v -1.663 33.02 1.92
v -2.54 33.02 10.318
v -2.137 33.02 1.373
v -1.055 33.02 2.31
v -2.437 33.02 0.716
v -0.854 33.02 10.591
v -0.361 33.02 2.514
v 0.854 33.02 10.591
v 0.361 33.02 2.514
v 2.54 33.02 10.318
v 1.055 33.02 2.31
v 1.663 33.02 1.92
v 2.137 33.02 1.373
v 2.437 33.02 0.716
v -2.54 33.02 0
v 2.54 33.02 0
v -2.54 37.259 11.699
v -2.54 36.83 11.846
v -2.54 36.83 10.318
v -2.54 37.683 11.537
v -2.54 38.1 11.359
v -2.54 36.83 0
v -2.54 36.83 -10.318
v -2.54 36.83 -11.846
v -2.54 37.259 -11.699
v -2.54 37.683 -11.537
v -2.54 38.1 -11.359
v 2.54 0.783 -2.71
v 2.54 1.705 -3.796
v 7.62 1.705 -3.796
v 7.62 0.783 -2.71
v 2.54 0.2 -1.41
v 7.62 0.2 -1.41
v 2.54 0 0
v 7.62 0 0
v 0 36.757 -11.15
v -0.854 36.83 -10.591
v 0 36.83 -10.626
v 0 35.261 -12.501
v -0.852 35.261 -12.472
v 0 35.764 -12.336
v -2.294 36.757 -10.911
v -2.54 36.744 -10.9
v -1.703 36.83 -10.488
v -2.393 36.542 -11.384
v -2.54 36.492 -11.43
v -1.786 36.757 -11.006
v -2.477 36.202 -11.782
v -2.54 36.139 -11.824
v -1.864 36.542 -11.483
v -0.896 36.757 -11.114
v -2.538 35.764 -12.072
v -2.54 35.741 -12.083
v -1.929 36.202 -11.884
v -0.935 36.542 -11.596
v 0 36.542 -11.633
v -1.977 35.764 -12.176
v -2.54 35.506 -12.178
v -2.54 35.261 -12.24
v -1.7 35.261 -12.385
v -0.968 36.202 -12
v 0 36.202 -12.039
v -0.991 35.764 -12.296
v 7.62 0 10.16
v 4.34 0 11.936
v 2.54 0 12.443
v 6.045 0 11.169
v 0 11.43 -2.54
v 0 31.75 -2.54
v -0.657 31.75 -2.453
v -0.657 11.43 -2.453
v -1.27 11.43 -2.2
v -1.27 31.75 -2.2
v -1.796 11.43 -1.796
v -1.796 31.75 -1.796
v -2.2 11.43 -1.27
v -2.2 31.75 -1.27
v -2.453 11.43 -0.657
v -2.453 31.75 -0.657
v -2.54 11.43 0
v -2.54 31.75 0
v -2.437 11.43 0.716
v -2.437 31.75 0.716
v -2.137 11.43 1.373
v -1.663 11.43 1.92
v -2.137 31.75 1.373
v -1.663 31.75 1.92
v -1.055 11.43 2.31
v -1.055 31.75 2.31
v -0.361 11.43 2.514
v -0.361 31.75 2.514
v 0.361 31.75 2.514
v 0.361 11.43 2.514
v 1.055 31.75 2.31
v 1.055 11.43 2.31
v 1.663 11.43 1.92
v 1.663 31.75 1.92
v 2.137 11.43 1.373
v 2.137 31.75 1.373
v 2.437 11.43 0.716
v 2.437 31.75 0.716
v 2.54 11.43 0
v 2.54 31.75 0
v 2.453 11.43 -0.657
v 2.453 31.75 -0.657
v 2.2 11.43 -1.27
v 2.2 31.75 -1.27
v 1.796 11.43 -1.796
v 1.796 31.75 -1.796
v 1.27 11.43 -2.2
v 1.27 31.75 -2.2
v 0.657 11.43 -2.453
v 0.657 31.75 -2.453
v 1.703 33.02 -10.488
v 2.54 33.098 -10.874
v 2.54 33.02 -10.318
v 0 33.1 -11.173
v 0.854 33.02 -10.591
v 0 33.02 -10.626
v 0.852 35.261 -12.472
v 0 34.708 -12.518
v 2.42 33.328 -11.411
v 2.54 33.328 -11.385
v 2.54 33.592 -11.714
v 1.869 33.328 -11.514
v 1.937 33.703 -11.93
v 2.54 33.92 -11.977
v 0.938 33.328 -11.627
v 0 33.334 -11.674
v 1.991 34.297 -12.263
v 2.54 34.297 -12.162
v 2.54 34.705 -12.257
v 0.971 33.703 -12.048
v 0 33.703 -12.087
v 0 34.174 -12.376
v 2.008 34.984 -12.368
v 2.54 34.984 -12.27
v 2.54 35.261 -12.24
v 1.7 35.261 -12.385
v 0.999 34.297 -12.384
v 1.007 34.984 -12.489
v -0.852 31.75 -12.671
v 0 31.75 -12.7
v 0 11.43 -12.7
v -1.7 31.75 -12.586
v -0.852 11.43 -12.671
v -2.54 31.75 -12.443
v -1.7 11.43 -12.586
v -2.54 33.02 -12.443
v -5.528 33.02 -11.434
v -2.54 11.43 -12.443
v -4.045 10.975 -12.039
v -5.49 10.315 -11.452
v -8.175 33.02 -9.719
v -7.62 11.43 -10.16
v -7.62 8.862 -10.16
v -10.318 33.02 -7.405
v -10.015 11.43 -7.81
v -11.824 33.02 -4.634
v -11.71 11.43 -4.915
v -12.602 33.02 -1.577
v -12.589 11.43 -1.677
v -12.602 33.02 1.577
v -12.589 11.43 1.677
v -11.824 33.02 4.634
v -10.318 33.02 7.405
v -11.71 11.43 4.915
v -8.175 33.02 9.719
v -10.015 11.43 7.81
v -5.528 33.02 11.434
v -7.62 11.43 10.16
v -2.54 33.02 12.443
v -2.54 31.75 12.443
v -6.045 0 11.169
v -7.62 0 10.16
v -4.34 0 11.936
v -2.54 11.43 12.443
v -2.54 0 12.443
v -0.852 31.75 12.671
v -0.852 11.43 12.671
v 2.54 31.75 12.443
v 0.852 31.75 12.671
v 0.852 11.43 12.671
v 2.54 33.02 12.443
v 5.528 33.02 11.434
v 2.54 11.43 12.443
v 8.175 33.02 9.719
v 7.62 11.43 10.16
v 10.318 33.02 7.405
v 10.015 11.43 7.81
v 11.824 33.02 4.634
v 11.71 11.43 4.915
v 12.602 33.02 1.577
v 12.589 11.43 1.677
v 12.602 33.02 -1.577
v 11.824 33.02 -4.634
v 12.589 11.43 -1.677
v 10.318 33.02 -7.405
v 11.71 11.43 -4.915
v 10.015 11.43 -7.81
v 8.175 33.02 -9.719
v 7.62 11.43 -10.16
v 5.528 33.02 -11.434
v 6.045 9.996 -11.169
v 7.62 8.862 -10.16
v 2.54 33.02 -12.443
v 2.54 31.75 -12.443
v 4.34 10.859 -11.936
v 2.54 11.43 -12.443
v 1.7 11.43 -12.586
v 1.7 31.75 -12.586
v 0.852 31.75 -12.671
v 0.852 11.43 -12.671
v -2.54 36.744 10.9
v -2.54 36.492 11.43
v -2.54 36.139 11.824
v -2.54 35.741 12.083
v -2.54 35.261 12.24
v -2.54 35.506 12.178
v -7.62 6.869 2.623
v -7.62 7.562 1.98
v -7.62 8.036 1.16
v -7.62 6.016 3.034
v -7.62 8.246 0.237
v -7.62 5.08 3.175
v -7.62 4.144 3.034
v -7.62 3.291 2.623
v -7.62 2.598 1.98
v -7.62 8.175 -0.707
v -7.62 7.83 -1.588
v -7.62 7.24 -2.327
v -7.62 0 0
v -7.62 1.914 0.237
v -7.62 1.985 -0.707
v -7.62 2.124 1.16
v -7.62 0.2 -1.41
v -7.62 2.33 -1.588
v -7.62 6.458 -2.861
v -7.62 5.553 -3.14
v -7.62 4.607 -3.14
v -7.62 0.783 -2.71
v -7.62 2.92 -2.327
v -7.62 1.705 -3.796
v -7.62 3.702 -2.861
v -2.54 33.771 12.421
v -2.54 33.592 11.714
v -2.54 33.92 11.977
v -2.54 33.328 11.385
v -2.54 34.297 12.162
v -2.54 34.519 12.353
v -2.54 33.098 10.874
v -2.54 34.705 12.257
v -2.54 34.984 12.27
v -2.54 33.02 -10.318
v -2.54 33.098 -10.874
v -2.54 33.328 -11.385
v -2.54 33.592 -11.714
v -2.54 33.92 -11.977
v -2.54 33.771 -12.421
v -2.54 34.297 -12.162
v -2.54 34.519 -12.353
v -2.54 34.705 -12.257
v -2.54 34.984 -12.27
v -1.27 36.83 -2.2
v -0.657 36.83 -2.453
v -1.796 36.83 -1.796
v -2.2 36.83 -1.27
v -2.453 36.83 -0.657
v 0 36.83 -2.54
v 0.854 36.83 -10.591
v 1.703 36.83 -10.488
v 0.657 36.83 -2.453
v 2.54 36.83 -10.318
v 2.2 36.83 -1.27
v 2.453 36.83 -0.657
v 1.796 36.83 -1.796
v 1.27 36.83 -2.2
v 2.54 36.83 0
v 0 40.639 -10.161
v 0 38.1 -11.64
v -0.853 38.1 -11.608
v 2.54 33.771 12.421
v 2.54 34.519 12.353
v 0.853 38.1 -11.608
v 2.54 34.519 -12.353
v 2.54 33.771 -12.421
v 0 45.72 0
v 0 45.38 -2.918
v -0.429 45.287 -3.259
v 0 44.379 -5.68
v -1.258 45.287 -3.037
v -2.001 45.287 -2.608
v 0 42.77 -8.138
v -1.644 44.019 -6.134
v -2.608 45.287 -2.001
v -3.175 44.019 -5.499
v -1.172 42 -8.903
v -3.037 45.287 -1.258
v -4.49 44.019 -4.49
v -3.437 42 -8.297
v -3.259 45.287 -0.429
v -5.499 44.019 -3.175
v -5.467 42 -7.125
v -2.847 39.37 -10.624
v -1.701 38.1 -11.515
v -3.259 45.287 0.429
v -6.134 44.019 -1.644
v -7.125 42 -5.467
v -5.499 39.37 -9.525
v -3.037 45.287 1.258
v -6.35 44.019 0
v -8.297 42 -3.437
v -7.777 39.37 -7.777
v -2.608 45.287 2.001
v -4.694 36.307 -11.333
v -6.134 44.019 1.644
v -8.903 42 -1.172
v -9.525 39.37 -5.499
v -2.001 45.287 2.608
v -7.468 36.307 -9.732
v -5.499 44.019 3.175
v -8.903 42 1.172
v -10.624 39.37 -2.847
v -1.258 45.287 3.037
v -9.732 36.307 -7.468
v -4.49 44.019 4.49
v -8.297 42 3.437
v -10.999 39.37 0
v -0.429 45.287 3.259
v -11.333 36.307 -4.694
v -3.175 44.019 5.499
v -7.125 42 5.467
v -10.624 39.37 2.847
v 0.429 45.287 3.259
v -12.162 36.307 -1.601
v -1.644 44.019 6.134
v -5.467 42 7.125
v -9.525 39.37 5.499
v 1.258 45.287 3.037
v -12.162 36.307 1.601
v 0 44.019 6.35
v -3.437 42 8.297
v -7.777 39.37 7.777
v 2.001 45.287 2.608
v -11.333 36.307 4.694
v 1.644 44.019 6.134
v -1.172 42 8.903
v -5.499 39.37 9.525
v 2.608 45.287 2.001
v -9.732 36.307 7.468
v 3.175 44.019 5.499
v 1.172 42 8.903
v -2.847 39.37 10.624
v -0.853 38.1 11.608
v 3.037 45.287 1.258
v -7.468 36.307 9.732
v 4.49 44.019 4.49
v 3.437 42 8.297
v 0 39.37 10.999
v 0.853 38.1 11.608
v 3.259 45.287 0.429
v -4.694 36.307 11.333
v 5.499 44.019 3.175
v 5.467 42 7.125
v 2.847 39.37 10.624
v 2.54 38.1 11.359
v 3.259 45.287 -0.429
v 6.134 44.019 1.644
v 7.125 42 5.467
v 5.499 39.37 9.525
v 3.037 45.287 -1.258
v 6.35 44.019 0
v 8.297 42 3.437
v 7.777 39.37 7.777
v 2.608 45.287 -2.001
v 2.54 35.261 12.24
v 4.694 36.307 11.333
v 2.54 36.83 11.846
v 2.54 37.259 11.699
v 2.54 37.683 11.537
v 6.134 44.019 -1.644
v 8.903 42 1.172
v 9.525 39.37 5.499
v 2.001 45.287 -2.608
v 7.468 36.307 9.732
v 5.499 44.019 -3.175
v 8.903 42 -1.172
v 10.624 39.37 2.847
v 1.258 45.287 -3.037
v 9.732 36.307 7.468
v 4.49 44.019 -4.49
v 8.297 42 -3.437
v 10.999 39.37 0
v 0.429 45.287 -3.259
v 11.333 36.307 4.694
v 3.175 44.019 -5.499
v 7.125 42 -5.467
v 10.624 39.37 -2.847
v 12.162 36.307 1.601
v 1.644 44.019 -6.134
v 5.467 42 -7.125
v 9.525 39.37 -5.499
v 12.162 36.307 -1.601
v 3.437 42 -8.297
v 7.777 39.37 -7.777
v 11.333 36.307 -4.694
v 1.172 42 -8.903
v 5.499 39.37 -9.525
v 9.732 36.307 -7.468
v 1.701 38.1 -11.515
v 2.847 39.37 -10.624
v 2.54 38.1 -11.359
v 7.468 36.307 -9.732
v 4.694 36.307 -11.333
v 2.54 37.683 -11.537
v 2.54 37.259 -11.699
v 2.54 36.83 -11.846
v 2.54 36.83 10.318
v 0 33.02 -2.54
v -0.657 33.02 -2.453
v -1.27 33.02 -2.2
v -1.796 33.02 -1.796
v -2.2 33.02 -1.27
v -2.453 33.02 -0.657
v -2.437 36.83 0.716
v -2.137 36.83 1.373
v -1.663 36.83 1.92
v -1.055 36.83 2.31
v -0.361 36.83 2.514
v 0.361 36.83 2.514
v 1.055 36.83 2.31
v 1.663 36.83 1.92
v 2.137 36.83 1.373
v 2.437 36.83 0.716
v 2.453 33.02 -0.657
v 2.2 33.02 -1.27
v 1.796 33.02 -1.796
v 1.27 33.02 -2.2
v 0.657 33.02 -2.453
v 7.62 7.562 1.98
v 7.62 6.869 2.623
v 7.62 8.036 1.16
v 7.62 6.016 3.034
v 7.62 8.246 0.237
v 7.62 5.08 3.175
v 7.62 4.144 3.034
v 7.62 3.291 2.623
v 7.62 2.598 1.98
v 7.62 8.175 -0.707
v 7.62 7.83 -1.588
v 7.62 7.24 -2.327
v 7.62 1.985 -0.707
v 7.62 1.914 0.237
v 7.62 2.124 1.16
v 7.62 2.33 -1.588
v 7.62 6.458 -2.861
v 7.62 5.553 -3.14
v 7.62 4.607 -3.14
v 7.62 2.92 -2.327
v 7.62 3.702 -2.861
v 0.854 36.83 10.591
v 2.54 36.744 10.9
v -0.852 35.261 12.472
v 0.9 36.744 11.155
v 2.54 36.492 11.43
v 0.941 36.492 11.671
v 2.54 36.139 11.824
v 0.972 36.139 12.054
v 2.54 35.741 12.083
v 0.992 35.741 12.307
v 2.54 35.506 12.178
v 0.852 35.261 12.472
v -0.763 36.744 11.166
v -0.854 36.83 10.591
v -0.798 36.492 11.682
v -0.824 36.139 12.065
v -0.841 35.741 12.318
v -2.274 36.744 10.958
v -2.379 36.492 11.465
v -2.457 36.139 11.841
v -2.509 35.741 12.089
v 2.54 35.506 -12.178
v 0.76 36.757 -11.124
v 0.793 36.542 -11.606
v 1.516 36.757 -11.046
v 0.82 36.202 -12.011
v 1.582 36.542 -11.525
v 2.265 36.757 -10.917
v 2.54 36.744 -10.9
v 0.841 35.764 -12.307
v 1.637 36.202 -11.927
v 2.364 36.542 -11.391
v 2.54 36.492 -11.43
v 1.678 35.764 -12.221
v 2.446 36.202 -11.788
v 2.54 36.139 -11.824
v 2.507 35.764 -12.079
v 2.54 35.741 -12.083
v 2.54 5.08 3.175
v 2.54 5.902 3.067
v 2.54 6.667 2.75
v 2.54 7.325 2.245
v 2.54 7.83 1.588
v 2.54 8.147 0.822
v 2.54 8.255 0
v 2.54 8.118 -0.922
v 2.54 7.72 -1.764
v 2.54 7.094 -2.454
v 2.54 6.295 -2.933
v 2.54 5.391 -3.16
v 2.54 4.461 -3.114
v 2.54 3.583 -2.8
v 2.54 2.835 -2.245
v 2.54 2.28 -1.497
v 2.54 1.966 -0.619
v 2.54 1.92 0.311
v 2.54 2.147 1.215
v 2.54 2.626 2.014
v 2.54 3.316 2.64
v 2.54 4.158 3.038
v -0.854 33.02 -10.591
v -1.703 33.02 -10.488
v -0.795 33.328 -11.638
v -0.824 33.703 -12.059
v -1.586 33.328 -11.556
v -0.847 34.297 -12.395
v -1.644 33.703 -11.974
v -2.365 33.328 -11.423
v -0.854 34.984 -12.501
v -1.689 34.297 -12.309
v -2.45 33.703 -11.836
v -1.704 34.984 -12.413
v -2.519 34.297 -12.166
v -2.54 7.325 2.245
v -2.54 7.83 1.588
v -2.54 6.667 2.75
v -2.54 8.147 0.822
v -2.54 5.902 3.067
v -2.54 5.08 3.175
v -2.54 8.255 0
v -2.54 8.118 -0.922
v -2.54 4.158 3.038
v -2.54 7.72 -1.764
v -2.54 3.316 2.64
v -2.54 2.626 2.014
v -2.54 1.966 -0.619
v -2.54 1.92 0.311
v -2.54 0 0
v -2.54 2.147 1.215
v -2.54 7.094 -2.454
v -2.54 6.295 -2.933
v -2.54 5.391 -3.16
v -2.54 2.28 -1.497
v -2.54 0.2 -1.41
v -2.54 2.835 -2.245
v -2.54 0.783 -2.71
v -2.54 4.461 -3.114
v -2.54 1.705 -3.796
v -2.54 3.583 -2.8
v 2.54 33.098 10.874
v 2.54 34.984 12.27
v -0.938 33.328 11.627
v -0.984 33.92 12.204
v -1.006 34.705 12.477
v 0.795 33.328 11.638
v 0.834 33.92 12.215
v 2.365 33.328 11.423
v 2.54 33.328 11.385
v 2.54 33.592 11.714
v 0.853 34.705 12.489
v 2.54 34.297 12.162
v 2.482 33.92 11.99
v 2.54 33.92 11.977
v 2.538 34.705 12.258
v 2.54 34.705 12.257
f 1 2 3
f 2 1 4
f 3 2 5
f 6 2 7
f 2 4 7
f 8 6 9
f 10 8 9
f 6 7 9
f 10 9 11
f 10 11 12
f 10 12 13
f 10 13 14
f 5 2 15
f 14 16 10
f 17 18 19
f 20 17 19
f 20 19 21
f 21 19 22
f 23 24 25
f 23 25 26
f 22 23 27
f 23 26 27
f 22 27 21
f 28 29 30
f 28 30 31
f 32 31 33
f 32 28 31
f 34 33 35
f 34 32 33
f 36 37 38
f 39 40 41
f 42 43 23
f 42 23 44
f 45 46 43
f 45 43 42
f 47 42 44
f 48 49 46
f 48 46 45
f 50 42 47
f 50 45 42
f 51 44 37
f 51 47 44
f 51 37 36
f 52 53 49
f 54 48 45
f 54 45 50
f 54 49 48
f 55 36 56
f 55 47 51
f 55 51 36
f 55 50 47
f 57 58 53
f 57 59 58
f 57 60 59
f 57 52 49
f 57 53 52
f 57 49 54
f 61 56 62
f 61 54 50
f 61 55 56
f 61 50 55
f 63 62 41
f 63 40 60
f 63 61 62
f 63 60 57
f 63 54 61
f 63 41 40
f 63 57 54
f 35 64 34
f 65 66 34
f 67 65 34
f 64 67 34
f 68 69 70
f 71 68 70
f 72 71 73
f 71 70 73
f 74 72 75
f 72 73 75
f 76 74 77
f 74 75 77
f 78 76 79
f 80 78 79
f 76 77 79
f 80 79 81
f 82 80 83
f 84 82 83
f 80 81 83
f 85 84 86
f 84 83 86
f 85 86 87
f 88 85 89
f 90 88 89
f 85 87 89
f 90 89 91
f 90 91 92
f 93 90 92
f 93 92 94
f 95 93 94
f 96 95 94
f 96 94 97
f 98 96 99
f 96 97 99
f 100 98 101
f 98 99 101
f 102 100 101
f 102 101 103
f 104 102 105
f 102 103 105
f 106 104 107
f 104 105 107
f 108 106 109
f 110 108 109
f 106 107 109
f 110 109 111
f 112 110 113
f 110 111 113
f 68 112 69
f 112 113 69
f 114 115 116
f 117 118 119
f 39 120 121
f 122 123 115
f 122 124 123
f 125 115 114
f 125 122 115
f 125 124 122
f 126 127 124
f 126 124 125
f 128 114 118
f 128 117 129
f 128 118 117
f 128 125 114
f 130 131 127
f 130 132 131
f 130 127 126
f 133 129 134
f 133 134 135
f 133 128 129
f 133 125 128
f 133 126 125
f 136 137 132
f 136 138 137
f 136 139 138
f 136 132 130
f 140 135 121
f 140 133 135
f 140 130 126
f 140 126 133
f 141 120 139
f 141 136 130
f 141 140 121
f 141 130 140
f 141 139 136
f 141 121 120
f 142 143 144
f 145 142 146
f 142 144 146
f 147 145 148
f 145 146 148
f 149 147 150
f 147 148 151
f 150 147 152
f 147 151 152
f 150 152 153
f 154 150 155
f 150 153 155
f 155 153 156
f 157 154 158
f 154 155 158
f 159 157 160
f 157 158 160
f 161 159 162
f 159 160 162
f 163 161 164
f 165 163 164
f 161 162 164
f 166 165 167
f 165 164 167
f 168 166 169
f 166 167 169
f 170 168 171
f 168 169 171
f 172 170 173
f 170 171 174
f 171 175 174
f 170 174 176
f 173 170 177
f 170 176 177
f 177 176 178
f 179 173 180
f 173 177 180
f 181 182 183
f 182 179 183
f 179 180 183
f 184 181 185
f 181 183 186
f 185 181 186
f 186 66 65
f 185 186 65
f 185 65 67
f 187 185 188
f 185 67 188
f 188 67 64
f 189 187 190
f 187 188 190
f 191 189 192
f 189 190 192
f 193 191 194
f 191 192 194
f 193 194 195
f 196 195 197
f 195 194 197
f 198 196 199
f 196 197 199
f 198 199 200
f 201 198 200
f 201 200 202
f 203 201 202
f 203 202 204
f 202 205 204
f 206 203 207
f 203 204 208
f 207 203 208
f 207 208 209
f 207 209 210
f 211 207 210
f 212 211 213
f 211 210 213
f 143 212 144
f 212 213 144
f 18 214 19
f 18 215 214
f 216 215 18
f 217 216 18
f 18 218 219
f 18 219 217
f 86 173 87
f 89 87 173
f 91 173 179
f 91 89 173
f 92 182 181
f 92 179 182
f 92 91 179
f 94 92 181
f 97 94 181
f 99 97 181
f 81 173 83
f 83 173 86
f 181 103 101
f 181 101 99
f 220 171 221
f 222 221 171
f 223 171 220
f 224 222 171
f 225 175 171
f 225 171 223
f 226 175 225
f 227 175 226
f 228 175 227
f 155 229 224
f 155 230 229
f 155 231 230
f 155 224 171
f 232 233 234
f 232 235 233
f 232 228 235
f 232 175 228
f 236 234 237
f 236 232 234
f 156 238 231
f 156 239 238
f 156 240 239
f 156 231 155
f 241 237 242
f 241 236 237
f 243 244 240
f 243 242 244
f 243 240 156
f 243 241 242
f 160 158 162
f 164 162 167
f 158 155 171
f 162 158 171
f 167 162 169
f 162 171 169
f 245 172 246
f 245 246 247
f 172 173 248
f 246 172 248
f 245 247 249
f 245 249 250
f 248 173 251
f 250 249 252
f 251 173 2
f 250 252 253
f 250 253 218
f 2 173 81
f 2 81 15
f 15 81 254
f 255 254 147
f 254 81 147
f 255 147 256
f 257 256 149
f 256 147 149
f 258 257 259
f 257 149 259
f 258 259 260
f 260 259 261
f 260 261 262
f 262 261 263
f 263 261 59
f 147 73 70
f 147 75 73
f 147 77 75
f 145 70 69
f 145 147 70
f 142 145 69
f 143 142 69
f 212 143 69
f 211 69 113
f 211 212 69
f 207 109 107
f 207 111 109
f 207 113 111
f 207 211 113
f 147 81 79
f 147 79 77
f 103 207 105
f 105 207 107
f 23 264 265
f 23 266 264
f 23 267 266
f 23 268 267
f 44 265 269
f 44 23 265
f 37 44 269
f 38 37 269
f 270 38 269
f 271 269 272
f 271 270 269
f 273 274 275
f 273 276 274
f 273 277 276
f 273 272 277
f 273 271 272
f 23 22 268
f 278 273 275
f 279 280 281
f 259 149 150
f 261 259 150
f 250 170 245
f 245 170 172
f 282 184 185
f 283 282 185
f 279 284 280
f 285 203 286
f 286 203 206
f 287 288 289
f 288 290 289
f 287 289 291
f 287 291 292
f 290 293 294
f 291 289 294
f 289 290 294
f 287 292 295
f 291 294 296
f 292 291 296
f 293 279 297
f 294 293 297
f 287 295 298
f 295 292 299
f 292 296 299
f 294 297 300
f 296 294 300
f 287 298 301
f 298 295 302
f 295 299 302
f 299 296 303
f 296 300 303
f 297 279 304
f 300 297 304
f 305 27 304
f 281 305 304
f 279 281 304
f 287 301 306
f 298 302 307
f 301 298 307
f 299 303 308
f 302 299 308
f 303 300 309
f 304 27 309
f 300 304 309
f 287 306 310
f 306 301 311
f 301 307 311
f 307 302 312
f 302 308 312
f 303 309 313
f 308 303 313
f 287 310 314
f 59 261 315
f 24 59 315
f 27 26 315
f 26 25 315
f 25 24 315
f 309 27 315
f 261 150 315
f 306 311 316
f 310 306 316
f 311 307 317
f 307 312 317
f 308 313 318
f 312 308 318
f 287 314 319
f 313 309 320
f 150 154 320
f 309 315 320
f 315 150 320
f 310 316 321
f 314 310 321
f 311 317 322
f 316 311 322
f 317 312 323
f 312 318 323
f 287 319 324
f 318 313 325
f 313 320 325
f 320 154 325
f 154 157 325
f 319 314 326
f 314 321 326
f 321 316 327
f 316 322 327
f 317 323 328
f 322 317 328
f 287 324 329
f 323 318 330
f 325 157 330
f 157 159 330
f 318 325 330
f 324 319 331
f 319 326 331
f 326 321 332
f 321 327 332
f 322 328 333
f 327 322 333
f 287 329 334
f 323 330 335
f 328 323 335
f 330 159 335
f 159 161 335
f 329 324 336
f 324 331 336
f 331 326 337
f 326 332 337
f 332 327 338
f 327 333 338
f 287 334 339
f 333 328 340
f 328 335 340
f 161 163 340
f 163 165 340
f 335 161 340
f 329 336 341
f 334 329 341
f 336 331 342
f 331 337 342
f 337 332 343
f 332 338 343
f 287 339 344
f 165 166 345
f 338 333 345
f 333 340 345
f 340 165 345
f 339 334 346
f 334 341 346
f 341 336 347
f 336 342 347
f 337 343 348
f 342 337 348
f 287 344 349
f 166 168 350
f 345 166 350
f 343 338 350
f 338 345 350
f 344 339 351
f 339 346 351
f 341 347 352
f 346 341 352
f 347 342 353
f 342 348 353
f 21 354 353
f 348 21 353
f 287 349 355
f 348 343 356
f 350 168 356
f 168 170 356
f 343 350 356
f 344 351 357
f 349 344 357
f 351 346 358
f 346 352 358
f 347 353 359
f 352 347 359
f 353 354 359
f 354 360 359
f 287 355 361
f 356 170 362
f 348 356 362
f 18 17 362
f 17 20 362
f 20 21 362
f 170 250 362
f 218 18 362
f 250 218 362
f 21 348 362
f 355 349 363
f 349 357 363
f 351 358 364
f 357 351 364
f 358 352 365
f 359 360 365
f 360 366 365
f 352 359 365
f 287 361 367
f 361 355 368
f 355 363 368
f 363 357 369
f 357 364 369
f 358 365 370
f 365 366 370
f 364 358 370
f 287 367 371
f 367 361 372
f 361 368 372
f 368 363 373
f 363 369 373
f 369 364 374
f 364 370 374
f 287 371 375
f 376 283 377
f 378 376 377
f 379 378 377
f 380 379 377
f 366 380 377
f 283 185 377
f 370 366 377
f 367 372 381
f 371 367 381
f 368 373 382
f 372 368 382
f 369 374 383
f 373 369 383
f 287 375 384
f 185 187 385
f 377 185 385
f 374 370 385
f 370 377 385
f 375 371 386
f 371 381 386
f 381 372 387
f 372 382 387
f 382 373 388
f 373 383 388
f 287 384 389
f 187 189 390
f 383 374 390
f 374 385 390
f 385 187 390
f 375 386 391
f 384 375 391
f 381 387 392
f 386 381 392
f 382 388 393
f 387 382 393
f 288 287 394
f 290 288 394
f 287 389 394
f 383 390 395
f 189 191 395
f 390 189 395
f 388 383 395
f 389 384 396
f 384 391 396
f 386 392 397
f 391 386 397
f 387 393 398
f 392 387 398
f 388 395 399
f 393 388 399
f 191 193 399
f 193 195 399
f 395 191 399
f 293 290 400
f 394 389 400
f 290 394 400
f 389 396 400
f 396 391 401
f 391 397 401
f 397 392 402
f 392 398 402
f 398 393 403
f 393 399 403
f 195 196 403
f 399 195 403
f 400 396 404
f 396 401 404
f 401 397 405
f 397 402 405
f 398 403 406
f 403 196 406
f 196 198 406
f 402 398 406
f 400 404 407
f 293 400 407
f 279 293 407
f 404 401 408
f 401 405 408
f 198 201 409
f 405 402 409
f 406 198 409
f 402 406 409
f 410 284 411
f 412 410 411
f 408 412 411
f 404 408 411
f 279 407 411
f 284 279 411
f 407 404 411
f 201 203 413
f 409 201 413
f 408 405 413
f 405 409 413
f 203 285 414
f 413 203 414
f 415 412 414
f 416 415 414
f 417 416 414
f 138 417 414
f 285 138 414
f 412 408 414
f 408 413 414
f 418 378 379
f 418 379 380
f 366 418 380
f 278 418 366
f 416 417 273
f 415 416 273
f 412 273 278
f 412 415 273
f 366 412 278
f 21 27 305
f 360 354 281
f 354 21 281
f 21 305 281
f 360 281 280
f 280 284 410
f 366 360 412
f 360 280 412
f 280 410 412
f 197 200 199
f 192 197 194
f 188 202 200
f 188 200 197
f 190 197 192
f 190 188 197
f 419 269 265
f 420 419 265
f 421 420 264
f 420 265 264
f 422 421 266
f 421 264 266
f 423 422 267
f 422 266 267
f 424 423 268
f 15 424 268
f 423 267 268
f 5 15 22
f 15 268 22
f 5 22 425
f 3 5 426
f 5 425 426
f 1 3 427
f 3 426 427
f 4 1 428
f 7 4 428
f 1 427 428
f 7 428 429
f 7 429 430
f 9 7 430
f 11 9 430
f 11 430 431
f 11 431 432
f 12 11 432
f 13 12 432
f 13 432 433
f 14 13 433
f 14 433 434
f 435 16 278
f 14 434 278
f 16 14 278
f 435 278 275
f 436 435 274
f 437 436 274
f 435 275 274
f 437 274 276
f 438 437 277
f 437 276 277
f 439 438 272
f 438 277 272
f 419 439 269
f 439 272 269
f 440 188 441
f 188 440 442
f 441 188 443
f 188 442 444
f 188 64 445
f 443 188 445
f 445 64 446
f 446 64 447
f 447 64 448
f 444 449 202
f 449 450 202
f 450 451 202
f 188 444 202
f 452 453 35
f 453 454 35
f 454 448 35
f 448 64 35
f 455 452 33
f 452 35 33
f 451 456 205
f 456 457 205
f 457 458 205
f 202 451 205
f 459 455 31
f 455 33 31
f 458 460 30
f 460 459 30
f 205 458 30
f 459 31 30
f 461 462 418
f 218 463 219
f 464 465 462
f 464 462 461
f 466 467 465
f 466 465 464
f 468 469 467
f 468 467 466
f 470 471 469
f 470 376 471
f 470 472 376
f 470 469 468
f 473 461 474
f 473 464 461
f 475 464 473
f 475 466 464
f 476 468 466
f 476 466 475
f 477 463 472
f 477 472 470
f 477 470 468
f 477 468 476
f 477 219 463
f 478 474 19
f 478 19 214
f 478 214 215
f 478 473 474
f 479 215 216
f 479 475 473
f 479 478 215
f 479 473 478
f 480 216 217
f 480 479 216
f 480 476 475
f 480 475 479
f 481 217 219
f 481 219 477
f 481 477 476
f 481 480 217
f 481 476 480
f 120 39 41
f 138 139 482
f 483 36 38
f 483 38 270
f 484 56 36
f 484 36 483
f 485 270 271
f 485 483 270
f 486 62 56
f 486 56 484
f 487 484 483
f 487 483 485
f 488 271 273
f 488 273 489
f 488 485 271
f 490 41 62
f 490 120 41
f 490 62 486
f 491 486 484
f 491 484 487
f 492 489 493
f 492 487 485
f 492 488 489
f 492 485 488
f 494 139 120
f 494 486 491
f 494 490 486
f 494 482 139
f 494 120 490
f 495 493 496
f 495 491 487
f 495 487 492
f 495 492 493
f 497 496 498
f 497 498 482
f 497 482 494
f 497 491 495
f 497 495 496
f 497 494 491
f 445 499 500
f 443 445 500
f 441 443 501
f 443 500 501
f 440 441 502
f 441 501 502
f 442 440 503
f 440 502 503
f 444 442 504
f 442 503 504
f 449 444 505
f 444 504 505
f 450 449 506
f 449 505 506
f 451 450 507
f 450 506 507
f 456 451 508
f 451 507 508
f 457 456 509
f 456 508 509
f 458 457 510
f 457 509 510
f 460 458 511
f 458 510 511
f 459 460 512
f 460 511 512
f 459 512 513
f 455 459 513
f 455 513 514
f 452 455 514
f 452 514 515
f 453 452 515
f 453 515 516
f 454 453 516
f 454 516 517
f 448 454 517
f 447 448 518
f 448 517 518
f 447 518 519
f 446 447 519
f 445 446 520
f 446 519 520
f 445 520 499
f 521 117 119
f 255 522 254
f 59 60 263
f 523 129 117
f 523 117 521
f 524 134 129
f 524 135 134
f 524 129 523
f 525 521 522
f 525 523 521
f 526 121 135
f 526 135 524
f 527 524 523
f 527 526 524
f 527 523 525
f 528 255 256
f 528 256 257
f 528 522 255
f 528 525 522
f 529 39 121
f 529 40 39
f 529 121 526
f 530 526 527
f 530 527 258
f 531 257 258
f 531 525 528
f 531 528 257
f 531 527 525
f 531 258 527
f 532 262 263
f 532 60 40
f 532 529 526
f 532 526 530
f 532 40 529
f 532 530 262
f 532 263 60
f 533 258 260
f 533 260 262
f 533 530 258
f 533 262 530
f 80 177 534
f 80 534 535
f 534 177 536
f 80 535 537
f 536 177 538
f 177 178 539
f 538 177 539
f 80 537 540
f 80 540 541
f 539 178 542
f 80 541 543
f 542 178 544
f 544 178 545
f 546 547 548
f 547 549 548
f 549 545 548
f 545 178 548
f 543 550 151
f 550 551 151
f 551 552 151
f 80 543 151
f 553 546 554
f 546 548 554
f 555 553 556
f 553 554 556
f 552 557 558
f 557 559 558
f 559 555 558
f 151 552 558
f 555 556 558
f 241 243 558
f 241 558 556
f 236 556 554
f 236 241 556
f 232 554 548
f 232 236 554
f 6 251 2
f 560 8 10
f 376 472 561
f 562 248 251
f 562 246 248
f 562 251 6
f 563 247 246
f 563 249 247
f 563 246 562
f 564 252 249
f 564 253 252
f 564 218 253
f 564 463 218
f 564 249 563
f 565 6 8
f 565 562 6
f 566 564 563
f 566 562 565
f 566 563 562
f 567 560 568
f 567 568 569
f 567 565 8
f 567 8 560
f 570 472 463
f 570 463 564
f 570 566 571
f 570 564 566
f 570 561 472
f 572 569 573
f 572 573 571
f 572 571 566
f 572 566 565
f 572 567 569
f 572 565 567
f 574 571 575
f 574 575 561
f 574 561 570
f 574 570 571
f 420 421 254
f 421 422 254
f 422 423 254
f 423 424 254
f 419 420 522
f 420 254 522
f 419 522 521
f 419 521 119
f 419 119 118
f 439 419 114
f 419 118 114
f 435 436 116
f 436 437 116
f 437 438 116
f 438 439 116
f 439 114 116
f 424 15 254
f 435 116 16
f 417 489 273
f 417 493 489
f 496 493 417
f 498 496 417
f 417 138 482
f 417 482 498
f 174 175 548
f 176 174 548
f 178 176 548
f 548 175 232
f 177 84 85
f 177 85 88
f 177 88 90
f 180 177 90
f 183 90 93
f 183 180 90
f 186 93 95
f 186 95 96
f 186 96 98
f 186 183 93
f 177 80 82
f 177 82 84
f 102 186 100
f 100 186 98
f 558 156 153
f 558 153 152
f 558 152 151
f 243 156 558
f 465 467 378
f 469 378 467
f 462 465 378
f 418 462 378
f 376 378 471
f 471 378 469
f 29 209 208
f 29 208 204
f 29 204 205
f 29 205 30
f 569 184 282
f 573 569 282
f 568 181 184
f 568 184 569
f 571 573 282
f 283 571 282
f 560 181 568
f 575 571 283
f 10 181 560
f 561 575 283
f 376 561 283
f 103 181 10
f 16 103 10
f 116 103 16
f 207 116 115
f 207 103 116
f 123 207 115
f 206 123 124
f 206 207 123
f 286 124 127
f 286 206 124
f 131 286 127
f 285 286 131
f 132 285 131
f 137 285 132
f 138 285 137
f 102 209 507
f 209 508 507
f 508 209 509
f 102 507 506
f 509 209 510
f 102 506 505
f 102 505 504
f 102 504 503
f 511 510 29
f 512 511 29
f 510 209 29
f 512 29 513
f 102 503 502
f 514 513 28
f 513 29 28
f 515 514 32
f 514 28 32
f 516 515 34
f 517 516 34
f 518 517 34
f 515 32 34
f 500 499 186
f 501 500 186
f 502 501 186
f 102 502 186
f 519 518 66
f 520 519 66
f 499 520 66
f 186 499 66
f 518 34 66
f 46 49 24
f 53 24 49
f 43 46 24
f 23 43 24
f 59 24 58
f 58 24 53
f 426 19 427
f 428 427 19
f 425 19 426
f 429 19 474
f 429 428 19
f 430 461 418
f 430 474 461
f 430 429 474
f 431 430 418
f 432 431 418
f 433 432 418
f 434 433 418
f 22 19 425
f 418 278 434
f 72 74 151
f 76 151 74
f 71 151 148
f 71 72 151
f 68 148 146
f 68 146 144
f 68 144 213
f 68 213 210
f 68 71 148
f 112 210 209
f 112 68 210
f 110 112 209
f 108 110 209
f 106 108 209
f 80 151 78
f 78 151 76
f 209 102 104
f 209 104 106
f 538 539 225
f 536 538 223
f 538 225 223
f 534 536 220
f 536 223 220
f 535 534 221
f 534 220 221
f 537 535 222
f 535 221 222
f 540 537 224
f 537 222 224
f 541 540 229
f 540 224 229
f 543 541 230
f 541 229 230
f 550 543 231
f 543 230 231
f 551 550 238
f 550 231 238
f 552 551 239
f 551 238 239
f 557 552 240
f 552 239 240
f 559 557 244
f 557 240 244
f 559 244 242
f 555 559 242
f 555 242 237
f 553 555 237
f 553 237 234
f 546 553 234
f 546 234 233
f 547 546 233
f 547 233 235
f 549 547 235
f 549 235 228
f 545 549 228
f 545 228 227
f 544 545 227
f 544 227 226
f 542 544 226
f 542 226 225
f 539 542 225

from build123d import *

# Parameters (mm, degrees)
CUT_EXTRUDE1_DEPTH      = 11.43
SKETCH3_R               = 3.175
CUT_EXTRUDE2_DEPTH      = 52.61889964
CUT_EXTRUDE3_DEPTH      = 50.121262199
CUT_EXTRUDE3_DEPTH_BACK = 50.121262199
SKETCH4_W               = 5.08
SKETCH4_H               = 1.27
FILLET1_R               = 1.905


with BuildPart() as part:
    # Sketch1 → Revolve1 (revolve)
    with BuildSketch(Plane.XY, mode=Mode.PRIVATE) as revolve1_sk:
        with BuildLine():
            Line((0, 0), (0, 5.602635041))
            Line((0, 5.602635041), (-2.54, 5.602635041))
            Line((-2.54, 5.602635041), (-2.54, 38.1))
            Line((-2.54, 38.1), (0, 38.1))
            Line((0, 38.1), (0, 45.72))
            ThreePointArc((0, 45.72), (-8.980256121, 42.000256121), (-12.7, 33.02))
            Line((-12.7, 33.02), (-12.7, 0))
            Line((-12.7, 0), (0, 0))
        make_face()
    revolve(revolve1_sk.sketch.rotate(Axis((0, 0, 0), (0, 1, 0)), 270), axis=Axis((0, 0, 0), (0, 1, 0)))

    # Sketch2 → Cut-Extrude1 (cut)
    with BuildSketch(Plane.XZ):
        with BuildLine():
            Line((-2.54, 12.443407893), (-2.54, -12.443407893))
            ThreePointArc((-2.54, -12.443407893), (0, -12.7), (2.54, -12.443407893))
            Line((2.54, -12.443407893), (2.54, 12.443407893))
            ThreePointArc((2.54, 12.443407893), (0, 12.7), (-2.54, 12.443407893))
        make_face()
        with BuildLine():
            Line((-7.62, 10.16), (-7.62, -10.16))
            ThreePointArc((-7.62, -10.16), (-12.7, 0), (-7.62, 10.16))
        make_face()
        with BuildLine():
            Line((7.62, 10.16), (7.62, -10.16))
            ThreePointArc((7.62, -10.16), (12.7, 0), (7.62, 10.16))
        make_face()
    extrude(amount=-CUT_EXTRUDE1_DEPTH, mode=Mode.SUBTRACT)

    # Sketch3 → Cut-Extrude2 (cut, through all)
    with BuildSketch(Plane.ZY.offset(7.62)):
        with Locations((0, 5.08)):
            Circle(SKETCH3_R)
        with BuildLine():
            Line((0, 0), (-12.443407893, 0))
            Line((-12.443407893, 0), (-12.443407893, 11.43))
            Line((-12.443407893, 11.43), (-3.796422114, 1.704562379))
            ThreePointArc((-3.796422114, 1.704562379), (-2.080766311, 0.445691901), (0, 0))
        make_face()
    extrude(amount=-CUT_EXTRUDE2_DEPTH, mode=Mode.SUBTRACT)

    # Sketch4 → Cut-Extrude3 (cut, two sides: drawn at the far end of the back side and taken through both)
    with BuildSketch(Plane.XY.offset(-CUT_EXTRUDE3_DEPTH_BACK)):
        with Locations((0, 32.385)):
            Rectangle(SKETCH4_W, SKETCH4_H)
        with Locations((0, 37.465)):
            Rectangle(SKETCH4_W, SKETCH4_H)
    extrude(amount=CUT_EXTRUDE3_DEPTH + CUT_EXTRUDE3_DEPTH_BACK, mode=Mode.SUBTRACT)

    # Fillet1
    # the kernel refuses this fillet: 1.905 mm, written as the material it takes off along each edge
    with BuildSketch(Plane(origin=(0, 33.02, 0), x_dir=(-0.60062876969462, 0, 0.7995280364159391), z_dir=(-0.7995280364159391, 0, -0.60062876969462))) as fillet1_piece_1_section:
        with BuildLine():
            CenterArc((10.625582337, 1.905), FILLET1_R, 270, 100.164248622)
            Line((10.625582337, 0), (12.7, 0))
            ThreePointArc((12.7, 0), (12.650073138, 1.125010933), (12.500685102, 2.241176471))
        make_face()
    fillet1_piece_1 = revolve(axis=Axis((0, 33.02, 0), (0, 1, 0)), revolution_arc=73.829886486, mode=Mode.PRIVATE)
    fillet1_piece_1 = split(fillet1_piece_1, bisect_by=Plane(origin=(2.54, 33.536908465, 12.1243087), z_dir=(-1, 0, 0)), keep=Keep.TOP, mode=Mode.PRIVATE)
    fillet1_piece_1 = split(fillet1_piece_1, bisect_by=Plane(origin=(-2.54, 33.536908465, 12.1243087), z_dir=(1, 0, 0)), keep=Keep.TOP, mode=Mode.PRIVATE)
    add(fillet1_piece_1, mode=Mode.SUBTRACT)
    with BuildSketch(Plane(origin=(0, 36.83, 0), x_dir=(0.5180820301307626, 0, 0.8553309359865265), z_dir=(0.8553309359865265, 0, -0.5180820301307626))) as fillet1_piece_2_section:
        with BuildLine():
            CenterArc((10.625582337, 1.905), FILLET1_R, 270, 79.835751378)
            Line((10.625582337, 0), (12.115027858, 0))
            ThreePointArc((12.115027858, 0), (12.332827452, 0.778273257), (12.500685102, 1.568823529))
        make_face()
    fillet1_piece_2 = revolve(axis=Axis((0, 36.83, 0), (0, -1, 0)), revolution_arc=62.407371172, mode=Mode.PRIVATE)
    fillet1_piece_2 = split(fillet1_piece_2, bisect_by=Plane(origin=(2.54, 36.48222625, 11.799196002), z_dir=(-1, 0, 0)), keep=Keep.TOP, mode=Mode.PRIVATE)
    fillet1_piece_2 = split(fillet1_piece_2, bisect_by=Plane(origin=(-2.54, 36.48222625, 11.799196002), z_dir=(1, 0, 0)), keep=Keep.TOP, mode=Mode.PRIVATE)
    add(fillet1_piece_2, mode=Mode.SUBTRACT)
    with BuildSketch(Plane(origin=(0, 36.83, 0), x_dir=(-0.5180758180945624, 0, -0.8553346986447176), z_dir=(-0.8553346986447176, 0, 0.5180758180945624))) as fillet1_piece_3_section:
        with BuildLine():
            CenterArc((10.625582337, 1.905), FILLET1_R, 270, 79.835751378)
            Line((10.625582337, 0), (12.115027858, 0))
            ThreePointArc((12.115027858, 0), (12.332827452, 0.778273257), (12.500685102, 1.568823529))
        make_face()
    fillet1_piece_3 = revolve(axis=Axis((0, 36.83, 0), (0, -1, 0)), revolution_arc=31.203269463, mode=Mode.PRIVATE)
    fillet1_piece_3 = split(fillet1_piece_3, bisect_by=Plane(origin=(-2.54, 36.482226182, -11.799196273), z_dir=(1, 0, 0)), keep=Keep.TOP, mode=Mode.PRIVATE)
    add(fillet1_piece_3, mode=Mode.SUBTRACT)
    with BuildSketch(Plane(origin=(0, 33.02, 0), x_dir=(0.6006217587640166, 0, -0.7995333031833131), z_dir=(0.7995333031833131, 0, 0.6006217587640166))) as fillet1_piece_4_section:
        with BuildLine():
            CenterArc((10.625582337, 1.905), FILLET1_R, 270, 100.164248622)
            Line((10.625582337, 0), (12.7, 0))
            ThreePointArc((12.7, 0), (12.650073138, 1.125010933), (12.500685102, 2.241176471))
        make_face()
    fillet1_piece_4 = revolve(axis=Axis((0, 33.02, 0), (0, 1, 0)), revolution_arc=36.914440828, mode=Mode.PRIVATE)
    fillet1_piece_4 = split(fillet1_piece_4, bisect_by=Plane(origin=(2.54, 33.536908471, -12.124308945), z_dir=(-1, 0, 0)), keep=Keep.TOP, mode=Mode.PRIVATE)
    add(fillet1_piece_4, mode=Mode.SUBTRACT)
    with BuildSketch(Plane(origin=(0, 33.02, 0), x_dir=(0, 0, -1), z_dir=(1, 0, 0))) as fillet1_piece_5_section:
        with BuildLine():
            CenterArc((10.625582337, 1.905), FILLET1_R, 270, 100.164248622)
            Line((10.625582337, 0), (12.7, 0))
            ThreePointArc((12.7, 0), (12.650073138, 1.125010933), (12.500685102, 2.241176471))
        make_face()
    fillet1_piece_5 = revolve(axis=Axis((0, 33.02, 0), (0, 1, 0)), revolution_arc=36.914440828, mode=Mode.PRIVATE)
    fillet1_piece_5 = split(fillet1_piece_5, bisect_by=Plane(origin=(-2.54, 33.536908442, -12.124308642), z_dir=(1, 0, 0)), keep=Keep.TOP, mode=Mode.PRIVATE)
    add(fillet1_piece_5, mode=Mode.SUBTRACT)
    with BuildSketch(Plane(origin=(0, 36.83, 0), x_dir=(0, 0, -1), z_dir=(-1, 0, 0))) as fillet1_piece_6_section:
        with BuildLine():
            CenterArc((10.625582337, 1.905), FILLET1_R, 270, 79.835751378)
            Line((10.625582337, 0), (12.115027858, 0))
            ThreePointArc((12.115027858, 0), (12.332827452, 0.778273257), (12.500685102, 1.568823529))
        make_face()
    fillet1_piece_6 = revolve(axis=Axis((0, 36.83, 0), (0, -1, 0)), revolution_arc=31.203269463, mode=Mode.PRIVATE)
    fillet1_piece_6 = split(fillet1_piece_6, bisect_by=Plane(origin=(2.54, 36.482226255, -11.799195907), z_dir=(-1, 0, 0)), keep=Keep.TOP, mode=Mode.PRIVATE)
    add(fillet1_piece_6, mode=Mode.SUBTRACT)


solid = part.part
